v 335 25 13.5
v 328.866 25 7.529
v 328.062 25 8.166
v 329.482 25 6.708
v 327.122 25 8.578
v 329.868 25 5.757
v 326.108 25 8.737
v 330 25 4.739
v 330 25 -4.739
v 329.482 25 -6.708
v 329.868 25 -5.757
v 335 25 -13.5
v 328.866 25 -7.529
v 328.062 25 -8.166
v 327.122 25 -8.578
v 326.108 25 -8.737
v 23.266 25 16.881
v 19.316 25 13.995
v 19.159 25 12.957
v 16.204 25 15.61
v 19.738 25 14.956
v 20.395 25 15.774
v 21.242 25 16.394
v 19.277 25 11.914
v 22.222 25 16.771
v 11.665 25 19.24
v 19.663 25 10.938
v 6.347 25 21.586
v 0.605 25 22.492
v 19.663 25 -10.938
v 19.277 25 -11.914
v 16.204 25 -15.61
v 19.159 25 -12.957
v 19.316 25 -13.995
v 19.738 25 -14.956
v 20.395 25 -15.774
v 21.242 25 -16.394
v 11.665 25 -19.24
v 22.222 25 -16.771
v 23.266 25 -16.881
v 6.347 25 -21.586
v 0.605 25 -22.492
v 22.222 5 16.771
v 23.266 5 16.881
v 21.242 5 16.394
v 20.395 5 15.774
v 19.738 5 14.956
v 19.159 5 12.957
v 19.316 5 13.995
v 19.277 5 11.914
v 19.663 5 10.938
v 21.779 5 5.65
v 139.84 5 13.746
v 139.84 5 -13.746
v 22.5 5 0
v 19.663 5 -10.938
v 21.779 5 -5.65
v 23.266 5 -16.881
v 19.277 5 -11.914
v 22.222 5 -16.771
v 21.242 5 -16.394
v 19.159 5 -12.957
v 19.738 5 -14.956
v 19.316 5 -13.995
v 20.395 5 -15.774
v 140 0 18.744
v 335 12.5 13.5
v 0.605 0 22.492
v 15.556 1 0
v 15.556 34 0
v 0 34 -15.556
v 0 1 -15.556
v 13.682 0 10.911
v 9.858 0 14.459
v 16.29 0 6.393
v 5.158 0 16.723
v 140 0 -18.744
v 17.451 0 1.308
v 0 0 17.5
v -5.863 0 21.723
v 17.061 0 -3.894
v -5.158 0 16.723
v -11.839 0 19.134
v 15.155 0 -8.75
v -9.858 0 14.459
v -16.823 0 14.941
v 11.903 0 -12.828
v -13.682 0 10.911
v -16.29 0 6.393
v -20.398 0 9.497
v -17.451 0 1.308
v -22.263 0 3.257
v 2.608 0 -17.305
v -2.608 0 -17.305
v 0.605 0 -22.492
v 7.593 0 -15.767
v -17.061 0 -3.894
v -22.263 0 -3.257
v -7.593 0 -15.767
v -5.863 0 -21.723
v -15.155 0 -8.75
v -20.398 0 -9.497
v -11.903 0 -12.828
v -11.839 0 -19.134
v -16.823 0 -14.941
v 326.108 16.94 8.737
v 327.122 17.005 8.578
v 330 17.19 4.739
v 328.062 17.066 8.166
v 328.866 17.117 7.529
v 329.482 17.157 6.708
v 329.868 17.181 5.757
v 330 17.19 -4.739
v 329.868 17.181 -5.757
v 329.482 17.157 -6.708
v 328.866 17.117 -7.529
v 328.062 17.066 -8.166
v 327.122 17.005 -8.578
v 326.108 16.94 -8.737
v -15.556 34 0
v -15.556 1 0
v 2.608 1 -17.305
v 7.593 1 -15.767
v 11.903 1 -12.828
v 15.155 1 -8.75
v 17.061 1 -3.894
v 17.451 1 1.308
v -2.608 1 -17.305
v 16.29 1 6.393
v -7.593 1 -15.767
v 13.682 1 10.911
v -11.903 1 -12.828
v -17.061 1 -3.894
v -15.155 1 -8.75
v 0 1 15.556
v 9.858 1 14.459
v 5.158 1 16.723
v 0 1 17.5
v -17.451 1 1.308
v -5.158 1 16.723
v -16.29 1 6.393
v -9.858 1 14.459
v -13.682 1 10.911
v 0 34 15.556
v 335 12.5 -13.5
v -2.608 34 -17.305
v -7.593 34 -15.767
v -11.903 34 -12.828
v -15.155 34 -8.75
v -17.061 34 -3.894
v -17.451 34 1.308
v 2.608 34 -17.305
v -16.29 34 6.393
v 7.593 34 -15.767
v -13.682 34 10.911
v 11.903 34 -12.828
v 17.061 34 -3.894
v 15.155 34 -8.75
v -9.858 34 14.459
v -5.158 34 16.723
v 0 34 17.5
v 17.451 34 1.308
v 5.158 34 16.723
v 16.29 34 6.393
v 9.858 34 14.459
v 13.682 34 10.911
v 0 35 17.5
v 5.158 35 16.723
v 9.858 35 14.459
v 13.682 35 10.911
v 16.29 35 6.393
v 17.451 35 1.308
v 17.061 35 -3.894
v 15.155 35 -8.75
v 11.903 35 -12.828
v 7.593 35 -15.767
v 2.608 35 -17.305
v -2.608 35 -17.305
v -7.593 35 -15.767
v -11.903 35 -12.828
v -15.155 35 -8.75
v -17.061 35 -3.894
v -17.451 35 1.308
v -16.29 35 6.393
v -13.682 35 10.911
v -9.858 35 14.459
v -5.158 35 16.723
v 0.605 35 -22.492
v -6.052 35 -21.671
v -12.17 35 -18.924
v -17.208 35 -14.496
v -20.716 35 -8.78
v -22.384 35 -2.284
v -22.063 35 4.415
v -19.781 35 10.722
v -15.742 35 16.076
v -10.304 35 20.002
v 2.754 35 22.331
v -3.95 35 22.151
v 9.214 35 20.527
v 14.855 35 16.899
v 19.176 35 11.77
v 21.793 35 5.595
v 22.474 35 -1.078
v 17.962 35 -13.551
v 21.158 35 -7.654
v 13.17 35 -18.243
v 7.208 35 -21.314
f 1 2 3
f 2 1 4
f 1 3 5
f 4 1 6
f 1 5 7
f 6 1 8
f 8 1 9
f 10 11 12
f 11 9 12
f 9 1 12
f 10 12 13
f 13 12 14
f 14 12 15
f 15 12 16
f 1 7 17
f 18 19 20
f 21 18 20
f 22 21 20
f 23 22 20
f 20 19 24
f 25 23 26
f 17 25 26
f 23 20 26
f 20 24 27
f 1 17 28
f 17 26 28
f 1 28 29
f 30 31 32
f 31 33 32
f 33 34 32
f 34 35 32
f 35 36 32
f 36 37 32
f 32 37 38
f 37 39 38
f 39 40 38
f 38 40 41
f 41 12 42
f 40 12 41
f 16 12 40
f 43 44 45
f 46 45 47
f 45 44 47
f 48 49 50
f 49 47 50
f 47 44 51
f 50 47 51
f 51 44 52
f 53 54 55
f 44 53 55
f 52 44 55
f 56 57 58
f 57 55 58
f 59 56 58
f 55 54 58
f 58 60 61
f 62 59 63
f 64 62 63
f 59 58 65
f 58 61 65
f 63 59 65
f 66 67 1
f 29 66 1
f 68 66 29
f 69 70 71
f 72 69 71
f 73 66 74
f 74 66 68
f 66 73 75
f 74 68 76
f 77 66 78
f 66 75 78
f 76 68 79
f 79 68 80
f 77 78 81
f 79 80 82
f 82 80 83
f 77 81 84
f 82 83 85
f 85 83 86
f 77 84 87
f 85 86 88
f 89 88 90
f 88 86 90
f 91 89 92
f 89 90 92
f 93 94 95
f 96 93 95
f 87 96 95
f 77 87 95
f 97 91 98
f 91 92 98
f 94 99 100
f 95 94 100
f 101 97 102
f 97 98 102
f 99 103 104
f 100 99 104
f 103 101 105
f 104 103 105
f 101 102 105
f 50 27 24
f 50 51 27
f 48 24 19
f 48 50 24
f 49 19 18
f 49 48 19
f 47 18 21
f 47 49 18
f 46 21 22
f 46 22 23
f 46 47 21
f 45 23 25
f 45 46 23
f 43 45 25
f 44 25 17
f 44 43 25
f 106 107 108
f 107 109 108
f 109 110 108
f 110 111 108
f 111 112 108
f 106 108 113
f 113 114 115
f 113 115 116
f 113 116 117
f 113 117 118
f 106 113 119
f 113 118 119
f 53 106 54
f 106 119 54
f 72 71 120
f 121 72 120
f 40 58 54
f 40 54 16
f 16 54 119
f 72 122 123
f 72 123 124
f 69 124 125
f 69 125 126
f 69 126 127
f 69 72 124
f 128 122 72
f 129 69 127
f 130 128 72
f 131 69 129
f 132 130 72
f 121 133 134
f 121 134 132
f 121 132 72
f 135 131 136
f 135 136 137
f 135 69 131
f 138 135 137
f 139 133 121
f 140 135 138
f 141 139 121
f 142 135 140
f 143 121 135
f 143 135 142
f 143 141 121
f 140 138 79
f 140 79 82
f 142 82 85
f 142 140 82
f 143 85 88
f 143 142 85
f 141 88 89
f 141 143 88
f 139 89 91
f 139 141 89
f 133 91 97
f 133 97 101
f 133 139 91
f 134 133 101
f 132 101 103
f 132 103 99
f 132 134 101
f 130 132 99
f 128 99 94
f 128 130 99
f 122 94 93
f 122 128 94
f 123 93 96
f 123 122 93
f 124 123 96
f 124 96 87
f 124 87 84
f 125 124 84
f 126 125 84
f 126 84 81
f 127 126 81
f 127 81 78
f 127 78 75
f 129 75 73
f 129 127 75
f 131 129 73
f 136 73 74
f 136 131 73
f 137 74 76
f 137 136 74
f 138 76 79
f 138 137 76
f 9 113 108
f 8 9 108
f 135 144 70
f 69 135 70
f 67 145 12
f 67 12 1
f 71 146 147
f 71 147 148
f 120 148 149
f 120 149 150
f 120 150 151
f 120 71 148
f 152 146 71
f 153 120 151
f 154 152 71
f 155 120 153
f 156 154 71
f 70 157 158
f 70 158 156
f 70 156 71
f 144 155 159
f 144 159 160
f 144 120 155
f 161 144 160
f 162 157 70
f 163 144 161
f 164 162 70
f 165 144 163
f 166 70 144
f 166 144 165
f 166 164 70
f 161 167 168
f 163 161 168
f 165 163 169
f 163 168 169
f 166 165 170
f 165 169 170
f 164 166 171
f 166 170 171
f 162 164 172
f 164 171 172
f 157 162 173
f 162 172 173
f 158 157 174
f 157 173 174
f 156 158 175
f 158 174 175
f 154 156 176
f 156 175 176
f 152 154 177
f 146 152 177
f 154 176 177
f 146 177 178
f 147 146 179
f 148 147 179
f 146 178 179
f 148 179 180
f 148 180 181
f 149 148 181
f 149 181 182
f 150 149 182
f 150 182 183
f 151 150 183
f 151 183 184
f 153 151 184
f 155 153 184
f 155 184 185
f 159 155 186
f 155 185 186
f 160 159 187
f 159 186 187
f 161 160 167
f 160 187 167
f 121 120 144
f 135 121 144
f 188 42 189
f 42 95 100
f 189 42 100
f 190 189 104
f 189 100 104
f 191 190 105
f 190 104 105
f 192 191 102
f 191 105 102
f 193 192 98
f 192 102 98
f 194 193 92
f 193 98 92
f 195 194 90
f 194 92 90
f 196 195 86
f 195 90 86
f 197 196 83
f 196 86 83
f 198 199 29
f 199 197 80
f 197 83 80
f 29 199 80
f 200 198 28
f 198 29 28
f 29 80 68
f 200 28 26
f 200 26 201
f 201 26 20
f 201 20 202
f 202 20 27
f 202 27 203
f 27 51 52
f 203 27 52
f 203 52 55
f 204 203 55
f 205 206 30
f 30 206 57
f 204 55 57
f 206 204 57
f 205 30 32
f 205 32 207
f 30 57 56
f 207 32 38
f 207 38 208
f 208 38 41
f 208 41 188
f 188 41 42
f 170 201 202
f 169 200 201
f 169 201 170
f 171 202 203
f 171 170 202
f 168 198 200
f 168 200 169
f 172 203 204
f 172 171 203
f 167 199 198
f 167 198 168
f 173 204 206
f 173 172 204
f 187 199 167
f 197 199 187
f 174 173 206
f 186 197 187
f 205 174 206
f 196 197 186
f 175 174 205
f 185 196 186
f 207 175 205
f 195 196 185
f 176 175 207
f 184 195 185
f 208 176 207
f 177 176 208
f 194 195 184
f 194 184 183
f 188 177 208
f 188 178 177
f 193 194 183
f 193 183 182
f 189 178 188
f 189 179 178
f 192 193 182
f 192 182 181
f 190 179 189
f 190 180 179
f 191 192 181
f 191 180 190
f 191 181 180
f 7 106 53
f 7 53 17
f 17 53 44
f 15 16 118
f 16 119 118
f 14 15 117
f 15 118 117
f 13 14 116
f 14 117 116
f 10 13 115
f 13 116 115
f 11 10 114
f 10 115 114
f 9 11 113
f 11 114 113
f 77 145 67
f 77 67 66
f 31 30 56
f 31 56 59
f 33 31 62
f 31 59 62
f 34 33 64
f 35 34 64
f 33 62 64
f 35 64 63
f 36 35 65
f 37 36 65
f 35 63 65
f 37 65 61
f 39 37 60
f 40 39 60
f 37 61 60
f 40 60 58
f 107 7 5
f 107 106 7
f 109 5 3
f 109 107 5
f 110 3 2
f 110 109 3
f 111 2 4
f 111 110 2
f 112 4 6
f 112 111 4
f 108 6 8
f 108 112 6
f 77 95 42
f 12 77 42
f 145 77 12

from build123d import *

# Parameters (mm, degrees)
EXTRUDE_X1_DEPTH          = 25
CUT_EXTRUDE_X2_DEPTH      = 337.68365599
CUT_EXTRUDE_X2_DEPTH_BACK = 337.68365599
SHELL_S1_T                = -5
SKETCH_C_R                = 22.5
EXTRUDE_X3_DEPTH          = 35
SKETCH_D_R                = 17.5
CUT_EXTRUDE_X5_DEPTH      = 1
CUT_EXTRUDE_START         = -1
SKETCH_E_R                = 17.5
CUT_EXTRUDE_X6_DEPTH      = 1
CUT_EXTRUDE_X7_DEPTH      = 338.471850678
FILLET_F1_R               = 4


with BuildPart() as part:
    # Sketch A → Extrude X1 (new body)
    with BuildSketch(Plane(origin=(0, 0, 0), x_dir=(1, 0, 0), z_dir=(0, 1, 0))):
        Polygon((0.604805244, 22.491869878), (335, 13.5), (335, -13.5), (0.604805244, -22.491869878), align=None)
    extrude(amount=EXTRUDE_X1_DEPTH)

    # Sketch B → Cut-Extrude X2 (cut, two sides: drawn at the far end of the back side and taken through both)
    with BuildSketch(Plane.XY.offset(-CUT_EXTRUDE_X2_DEPTH_BACK)):
        Polygon((335, 12.5), (140, 0), (140, -74.146668182), (362.466184873, -74.146668182), (356.911911272, 12.5), align=None)
    extrude(amount=CUT_EXTRUDE_X2_DEPTH + CUT_EXTRUDE_X2_DEPTH_BACK, mode=Mode.SUBTRACT)

    # Shell S1
    shell_s1_openings = [part.faces().sort_by_distance(p)[0] for p in [
        (153.878711478, 25, 0),
        (0.604805244, 12.5, 0),
    ]]
    offset(amount=SHELL_S1_T, openings=shell_s1_openings, kind=Kind.INTERSECTION)

    # Sketch C → Extrude X3 (add)
    with BuildSketch(Plane(origin=(0, 0, 0), x_dir=(1, 0, 0), z_dir=(0, 1, 0))):
        with Locations(Location((0, 0, 0), (0, 0, 88.459690565))):
            Circle(SKETCH_C_R)
    extrude(amount=EXTRUDE_X3_DEPTH)

    # Sketch D → Cut-Extrude X5 (cut)
    with BuildSketch(Plane(origin=(0, 35, 0), x_dir=(1, 0, 0), z_dir=(0, 1, 0))):
        with Locations(Location((0, 0, 0), (0, 0, 270))):
            Circle(SKETCH_D_R)
    extrude(amount=-CUT_EXTRUDE_X5_DEPTH, mode=Mode.SUBTRACT)

    # Sketch E → Cut-Extrude X6 (cut)
    with BuildSketch(Plane.XZ.offset(CUT_EXTRUDE_START)):
        with Locations(Location((0, 0, 0), (0, 0, 90))):
            Circle(SKETCH_E_R)
    extrude(amount=CUT_EXTRUDE_X6_DEPTH, mode=Mode.SUBTRACT)

    # Sketch F → Cut-Extrude X7 (cut, through all)
    with BuildSketch(Plane(origin=(0, 1, 0), x_dir=(1, 0, 0), z_dir=(0, 1, 0))):
        Polygon((0, 15.556349186), (-15.556349186, 0), (0, -15.556349186), (15.556349186, 0), align=None)
    extrude(amount=CUT_EXTRUDE_X7_DEPTH, mode=Mode.SUBTRACT)

    # Fillet F1
    fillet_f1_edges = [part.edges().sort_by_distance(p)[0] for p in [
        (330, 21.094874747, 8.6326424),
        (330, 21.094874747, -8.6326424),
        (14.607429601, 15, -17.11353267),
        (14.607429601, 15, 17.11353267),
    ]]
    fillet(fillet_f1_edges, radius=FILLET_F1_R)


solid = part.part
